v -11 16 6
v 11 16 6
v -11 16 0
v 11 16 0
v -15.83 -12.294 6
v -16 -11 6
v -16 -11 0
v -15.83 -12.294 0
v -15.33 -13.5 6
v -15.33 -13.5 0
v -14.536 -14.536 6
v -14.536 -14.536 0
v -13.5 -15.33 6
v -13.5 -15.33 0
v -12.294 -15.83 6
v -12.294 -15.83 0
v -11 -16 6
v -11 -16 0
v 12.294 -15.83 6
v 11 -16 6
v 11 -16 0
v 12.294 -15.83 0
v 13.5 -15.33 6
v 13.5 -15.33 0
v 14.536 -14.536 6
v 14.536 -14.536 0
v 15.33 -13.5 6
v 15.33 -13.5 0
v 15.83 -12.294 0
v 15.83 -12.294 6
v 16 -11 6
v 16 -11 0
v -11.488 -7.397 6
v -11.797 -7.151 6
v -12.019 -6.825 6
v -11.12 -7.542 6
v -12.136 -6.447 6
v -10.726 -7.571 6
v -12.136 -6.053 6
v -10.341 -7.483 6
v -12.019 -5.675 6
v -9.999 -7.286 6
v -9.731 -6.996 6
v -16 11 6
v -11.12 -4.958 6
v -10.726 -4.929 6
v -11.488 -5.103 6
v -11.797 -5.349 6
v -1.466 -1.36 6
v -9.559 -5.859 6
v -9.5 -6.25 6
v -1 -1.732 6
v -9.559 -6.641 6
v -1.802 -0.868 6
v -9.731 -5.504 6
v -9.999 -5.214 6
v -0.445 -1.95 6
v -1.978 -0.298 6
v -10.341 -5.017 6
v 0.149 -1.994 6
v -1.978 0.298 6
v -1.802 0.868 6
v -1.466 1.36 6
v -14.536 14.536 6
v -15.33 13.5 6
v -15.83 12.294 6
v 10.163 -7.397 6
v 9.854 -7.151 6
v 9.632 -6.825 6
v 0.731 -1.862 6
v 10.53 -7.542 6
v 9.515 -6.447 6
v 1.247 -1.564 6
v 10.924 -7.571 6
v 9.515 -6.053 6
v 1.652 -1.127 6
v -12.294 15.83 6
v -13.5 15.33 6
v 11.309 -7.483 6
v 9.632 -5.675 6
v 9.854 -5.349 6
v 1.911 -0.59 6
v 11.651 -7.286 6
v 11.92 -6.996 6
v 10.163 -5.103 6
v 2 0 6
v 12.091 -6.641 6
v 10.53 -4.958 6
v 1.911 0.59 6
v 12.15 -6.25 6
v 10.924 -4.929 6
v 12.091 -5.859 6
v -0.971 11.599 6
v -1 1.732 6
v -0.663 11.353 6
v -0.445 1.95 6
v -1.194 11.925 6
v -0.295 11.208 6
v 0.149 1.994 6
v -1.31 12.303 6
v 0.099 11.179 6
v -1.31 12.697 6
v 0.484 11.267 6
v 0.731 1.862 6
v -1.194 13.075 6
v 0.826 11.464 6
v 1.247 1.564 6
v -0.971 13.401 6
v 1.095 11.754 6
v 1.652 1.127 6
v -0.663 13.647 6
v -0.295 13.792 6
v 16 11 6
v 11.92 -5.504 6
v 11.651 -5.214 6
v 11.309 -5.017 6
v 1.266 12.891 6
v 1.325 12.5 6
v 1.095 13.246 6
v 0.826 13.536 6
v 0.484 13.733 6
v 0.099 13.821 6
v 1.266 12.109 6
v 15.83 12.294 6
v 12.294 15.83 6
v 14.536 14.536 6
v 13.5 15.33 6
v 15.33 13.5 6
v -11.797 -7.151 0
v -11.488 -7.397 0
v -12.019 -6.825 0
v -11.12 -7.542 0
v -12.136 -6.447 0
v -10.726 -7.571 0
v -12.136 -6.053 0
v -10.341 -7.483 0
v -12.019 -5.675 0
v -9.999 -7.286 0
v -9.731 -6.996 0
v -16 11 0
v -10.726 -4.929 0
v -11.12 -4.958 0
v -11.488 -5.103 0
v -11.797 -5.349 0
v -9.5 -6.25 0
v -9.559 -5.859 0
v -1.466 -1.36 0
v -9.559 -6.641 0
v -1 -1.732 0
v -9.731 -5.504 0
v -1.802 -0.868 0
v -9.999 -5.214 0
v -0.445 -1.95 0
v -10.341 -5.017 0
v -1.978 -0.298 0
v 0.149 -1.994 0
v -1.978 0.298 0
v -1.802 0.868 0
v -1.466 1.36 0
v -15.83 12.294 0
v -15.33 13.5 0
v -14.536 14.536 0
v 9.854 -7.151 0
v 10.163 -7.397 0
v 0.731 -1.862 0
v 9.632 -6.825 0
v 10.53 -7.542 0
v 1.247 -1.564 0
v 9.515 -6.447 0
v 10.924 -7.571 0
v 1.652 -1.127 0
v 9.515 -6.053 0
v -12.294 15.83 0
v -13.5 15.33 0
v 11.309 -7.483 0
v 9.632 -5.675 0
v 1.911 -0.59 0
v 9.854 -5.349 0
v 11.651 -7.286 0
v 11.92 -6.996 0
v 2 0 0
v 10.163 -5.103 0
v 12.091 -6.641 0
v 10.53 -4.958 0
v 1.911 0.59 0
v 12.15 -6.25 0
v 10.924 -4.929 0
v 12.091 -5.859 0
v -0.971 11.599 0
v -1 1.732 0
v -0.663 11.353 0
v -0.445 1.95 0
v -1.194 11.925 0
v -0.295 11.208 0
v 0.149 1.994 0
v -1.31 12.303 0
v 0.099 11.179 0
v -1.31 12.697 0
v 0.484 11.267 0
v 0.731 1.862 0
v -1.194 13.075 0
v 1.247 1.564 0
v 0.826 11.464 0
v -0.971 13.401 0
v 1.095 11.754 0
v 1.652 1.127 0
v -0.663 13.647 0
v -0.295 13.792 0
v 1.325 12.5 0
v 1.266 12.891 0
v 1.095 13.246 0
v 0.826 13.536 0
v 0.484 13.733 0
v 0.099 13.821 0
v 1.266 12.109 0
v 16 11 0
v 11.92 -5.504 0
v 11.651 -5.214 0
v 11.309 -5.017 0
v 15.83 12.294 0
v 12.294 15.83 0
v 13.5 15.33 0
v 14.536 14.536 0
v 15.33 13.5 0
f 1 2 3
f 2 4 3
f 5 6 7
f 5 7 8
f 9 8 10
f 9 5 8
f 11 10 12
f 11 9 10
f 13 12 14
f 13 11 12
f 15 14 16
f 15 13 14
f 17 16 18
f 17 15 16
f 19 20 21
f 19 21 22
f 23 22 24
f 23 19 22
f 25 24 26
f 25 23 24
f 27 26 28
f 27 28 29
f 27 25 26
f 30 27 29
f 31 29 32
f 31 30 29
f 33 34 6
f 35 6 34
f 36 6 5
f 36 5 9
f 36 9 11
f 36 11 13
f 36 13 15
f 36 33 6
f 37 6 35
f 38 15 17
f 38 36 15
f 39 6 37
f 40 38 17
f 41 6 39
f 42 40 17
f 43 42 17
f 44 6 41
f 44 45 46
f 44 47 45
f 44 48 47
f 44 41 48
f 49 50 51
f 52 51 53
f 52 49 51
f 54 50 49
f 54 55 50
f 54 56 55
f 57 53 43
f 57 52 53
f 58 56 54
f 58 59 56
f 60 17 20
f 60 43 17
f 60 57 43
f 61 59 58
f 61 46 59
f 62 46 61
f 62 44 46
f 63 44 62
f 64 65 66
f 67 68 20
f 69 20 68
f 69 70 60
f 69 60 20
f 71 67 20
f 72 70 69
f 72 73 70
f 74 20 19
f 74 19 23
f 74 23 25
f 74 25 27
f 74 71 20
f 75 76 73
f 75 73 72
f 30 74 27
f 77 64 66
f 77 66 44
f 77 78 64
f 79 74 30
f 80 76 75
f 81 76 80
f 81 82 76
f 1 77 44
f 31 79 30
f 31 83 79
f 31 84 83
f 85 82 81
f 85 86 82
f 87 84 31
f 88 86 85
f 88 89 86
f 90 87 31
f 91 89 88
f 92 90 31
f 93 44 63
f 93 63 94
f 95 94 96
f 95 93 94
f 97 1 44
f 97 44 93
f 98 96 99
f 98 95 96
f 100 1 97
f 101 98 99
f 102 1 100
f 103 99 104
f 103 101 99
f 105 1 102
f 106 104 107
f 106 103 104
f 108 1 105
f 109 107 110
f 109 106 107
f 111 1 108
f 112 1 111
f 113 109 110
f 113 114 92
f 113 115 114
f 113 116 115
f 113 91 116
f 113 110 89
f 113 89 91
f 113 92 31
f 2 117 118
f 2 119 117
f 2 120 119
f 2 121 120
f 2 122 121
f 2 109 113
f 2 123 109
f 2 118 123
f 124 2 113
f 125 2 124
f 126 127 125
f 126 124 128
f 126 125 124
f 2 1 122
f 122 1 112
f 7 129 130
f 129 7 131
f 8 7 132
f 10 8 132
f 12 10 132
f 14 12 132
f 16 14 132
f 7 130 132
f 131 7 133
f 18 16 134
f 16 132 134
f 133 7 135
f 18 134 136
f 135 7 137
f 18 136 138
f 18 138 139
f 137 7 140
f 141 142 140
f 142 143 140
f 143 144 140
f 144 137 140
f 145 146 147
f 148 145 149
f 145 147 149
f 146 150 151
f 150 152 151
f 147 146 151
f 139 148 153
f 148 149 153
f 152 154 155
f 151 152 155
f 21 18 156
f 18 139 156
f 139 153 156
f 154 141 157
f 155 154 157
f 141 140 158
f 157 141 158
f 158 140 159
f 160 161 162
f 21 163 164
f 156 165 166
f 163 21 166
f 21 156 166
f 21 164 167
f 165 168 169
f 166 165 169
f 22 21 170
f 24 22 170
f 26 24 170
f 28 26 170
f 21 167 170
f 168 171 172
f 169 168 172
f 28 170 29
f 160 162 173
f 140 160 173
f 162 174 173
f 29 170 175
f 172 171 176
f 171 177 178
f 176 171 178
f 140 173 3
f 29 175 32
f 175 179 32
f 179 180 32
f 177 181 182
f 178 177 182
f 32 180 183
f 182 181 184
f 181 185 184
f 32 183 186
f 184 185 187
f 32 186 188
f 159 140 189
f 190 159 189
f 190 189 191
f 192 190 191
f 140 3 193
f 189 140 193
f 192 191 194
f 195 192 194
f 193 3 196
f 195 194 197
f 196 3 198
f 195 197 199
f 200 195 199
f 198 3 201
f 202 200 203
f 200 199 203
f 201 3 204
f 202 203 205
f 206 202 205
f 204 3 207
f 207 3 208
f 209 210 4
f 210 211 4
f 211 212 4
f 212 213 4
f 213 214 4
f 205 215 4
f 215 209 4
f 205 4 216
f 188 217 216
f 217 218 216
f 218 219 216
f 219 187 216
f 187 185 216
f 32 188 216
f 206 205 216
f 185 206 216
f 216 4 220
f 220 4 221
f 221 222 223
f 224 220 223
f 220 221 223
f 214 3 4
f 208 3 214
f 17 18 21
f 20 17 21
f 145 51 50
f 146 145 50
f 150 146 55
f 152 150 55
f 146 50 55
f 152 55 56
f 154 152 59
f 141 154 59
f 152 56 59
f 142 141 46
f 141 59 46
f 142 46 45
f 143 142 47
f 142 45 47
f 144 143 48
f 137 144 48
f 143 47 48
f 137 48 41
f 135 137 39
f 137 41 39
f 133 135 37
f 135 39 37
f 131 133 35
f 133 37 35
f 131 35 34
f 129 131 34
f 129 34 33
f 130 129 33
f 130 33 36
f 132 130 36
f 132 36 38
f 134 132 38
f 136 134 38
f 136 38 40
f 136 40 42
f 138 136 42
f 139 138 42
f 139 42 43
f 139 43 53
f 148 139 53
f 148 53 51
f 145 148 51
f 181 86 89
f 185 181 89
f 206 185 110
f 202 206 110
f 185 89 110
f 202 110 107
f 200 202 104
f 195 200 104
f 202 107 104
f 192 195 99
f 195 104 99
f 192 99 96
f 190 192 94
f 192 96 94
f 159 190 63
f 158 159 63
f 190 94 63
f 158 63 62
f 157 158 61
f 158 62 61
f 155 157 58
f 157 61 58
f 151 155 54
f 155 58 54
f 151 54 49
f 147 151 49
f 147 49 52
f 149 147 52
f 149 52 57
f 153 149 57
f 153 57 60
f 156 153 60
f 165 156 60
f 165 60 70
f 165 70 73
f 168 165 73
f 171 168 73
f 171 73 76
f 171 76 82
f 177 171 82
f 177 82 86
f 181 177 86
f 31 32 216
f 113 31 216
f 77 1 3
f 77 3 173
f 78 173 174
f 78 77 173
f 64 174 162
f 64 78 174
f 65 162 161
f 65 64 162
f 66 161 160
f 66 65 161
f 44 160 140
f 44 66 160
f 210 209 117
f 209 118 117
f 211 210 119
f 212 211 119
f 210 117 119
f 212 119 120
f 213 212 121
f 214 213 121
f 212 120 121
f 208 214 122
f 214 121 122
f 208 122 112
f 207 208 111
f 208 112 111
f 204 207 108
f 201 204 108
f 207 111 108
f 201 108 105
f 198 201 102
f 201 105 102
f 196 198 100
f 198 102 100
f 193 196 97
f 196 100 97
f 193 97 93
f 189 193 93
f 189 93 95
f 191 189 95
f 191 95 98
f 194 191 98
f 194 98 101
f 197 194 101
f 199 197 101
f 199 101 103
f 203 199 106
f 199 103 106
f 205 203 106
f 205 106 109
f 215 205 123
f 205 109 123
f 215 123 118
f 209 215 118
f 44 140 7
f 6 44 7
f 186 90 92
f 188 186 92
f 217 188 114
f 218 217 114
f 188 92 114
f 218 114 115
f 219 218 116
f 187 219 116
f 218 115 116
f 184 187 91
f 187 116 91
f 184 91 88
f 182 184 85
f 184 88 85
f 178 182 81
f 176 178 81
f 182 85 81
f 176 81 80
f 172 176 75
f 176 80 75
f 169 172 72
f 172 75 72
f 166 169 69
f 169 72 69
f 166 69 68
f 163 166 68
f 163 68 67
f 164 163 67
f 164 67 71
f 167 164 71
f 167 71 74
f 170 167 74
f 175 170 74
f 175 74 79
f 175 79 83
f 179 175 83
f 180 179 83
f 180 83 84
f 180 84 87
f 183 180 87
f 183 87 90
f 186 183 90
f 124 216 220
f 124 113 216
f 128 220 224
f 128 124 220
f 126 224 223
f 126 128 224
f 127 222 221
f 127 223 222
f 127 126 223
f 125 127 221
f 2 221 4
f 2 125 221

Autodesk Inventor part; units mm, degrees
ref_plane "YZ Plane" through (0, 0, 0) normal (1, 0, 0) x (0, 1, 0)
ref_plane "XZ Plane" through (0, 0, 0) normal (0, 1, 0) x (-1, 0, 0)
ref_plane "XY Plane" through (0, 0, 0) normal (0, 0, 1) x (1, 0, 0)
sketch "Sketch1" plane through (0, 0, 0) normal (0, 0, 1) x (1, 0, 0)
  circle A0 centre (0, 0) radius 16 construction
  line L0 (-16, -16) -> (16, -16)
  line L1 (16, -16) -> (16, 16)
  line L2 (16, 16) -> (-16, 16)
  line L3 (-16, 16) -> (-16, -16)
  line L4 (-16, -16) -> (16, 16) construction
  line L5 (16, -16) -> (-16, 16) construction
  dimension "d0" = 32
extrude "Extrusion1" add sketch "Sketch1" along normal blind 6
sketch "Sketch2" plane through (0, 0, 6) normal (0, 0, 1) x (1, 0, 0)
  circle A0 centre (0, 0) radius 2
  dimension "d3" = 4
extrude "Extrusion2" cut sketch "Sketch2" against normal up to surface (6 mm away)
fillet "Fillet1" radius 5 4 edges at (16, 16, 3) (16, -16, 3) (-16, -16, 3) (-16, 16, 3)
sketch "Sketch3" plane through (0, 0, 6) normal (0, 0, 1) x (1, 0, 0)
  circle A0 centre (0, 0) radius 2 construction
  circle A1 centre (0, 0) radius 12.5 construction
  line L0 (0, -22.4) -> (0, 22.4) construction
  line L1 (-22.4, 0) -> (22.4, 0) construction
  circle A2 centre (0, 12.5) radius 1.325
  circle A3 centre (10.8253, -6.25) radius 1.325
  circle A4 centre (-10.8253, -6.25) radius 1.325
  line L2 (0, 0) -> (22.5547, -13.0219) construction
  line L3 (0, 0) -> (-20.3118, -11.727) construction
  dimension "d7" = 25
  dimension "d8" = 2.65
  dimension "d9" = 2.65
  dimension "d10" = 2.65
  dimension "d11" = 30
  dimension "d12" = 30
extrude "Extrusion3" cut sketch "Sketch3" against normal through all
equation "\"d9\" = d8"
equation "\"d10\" = d8"
properties part number "MiddleStandOff"
